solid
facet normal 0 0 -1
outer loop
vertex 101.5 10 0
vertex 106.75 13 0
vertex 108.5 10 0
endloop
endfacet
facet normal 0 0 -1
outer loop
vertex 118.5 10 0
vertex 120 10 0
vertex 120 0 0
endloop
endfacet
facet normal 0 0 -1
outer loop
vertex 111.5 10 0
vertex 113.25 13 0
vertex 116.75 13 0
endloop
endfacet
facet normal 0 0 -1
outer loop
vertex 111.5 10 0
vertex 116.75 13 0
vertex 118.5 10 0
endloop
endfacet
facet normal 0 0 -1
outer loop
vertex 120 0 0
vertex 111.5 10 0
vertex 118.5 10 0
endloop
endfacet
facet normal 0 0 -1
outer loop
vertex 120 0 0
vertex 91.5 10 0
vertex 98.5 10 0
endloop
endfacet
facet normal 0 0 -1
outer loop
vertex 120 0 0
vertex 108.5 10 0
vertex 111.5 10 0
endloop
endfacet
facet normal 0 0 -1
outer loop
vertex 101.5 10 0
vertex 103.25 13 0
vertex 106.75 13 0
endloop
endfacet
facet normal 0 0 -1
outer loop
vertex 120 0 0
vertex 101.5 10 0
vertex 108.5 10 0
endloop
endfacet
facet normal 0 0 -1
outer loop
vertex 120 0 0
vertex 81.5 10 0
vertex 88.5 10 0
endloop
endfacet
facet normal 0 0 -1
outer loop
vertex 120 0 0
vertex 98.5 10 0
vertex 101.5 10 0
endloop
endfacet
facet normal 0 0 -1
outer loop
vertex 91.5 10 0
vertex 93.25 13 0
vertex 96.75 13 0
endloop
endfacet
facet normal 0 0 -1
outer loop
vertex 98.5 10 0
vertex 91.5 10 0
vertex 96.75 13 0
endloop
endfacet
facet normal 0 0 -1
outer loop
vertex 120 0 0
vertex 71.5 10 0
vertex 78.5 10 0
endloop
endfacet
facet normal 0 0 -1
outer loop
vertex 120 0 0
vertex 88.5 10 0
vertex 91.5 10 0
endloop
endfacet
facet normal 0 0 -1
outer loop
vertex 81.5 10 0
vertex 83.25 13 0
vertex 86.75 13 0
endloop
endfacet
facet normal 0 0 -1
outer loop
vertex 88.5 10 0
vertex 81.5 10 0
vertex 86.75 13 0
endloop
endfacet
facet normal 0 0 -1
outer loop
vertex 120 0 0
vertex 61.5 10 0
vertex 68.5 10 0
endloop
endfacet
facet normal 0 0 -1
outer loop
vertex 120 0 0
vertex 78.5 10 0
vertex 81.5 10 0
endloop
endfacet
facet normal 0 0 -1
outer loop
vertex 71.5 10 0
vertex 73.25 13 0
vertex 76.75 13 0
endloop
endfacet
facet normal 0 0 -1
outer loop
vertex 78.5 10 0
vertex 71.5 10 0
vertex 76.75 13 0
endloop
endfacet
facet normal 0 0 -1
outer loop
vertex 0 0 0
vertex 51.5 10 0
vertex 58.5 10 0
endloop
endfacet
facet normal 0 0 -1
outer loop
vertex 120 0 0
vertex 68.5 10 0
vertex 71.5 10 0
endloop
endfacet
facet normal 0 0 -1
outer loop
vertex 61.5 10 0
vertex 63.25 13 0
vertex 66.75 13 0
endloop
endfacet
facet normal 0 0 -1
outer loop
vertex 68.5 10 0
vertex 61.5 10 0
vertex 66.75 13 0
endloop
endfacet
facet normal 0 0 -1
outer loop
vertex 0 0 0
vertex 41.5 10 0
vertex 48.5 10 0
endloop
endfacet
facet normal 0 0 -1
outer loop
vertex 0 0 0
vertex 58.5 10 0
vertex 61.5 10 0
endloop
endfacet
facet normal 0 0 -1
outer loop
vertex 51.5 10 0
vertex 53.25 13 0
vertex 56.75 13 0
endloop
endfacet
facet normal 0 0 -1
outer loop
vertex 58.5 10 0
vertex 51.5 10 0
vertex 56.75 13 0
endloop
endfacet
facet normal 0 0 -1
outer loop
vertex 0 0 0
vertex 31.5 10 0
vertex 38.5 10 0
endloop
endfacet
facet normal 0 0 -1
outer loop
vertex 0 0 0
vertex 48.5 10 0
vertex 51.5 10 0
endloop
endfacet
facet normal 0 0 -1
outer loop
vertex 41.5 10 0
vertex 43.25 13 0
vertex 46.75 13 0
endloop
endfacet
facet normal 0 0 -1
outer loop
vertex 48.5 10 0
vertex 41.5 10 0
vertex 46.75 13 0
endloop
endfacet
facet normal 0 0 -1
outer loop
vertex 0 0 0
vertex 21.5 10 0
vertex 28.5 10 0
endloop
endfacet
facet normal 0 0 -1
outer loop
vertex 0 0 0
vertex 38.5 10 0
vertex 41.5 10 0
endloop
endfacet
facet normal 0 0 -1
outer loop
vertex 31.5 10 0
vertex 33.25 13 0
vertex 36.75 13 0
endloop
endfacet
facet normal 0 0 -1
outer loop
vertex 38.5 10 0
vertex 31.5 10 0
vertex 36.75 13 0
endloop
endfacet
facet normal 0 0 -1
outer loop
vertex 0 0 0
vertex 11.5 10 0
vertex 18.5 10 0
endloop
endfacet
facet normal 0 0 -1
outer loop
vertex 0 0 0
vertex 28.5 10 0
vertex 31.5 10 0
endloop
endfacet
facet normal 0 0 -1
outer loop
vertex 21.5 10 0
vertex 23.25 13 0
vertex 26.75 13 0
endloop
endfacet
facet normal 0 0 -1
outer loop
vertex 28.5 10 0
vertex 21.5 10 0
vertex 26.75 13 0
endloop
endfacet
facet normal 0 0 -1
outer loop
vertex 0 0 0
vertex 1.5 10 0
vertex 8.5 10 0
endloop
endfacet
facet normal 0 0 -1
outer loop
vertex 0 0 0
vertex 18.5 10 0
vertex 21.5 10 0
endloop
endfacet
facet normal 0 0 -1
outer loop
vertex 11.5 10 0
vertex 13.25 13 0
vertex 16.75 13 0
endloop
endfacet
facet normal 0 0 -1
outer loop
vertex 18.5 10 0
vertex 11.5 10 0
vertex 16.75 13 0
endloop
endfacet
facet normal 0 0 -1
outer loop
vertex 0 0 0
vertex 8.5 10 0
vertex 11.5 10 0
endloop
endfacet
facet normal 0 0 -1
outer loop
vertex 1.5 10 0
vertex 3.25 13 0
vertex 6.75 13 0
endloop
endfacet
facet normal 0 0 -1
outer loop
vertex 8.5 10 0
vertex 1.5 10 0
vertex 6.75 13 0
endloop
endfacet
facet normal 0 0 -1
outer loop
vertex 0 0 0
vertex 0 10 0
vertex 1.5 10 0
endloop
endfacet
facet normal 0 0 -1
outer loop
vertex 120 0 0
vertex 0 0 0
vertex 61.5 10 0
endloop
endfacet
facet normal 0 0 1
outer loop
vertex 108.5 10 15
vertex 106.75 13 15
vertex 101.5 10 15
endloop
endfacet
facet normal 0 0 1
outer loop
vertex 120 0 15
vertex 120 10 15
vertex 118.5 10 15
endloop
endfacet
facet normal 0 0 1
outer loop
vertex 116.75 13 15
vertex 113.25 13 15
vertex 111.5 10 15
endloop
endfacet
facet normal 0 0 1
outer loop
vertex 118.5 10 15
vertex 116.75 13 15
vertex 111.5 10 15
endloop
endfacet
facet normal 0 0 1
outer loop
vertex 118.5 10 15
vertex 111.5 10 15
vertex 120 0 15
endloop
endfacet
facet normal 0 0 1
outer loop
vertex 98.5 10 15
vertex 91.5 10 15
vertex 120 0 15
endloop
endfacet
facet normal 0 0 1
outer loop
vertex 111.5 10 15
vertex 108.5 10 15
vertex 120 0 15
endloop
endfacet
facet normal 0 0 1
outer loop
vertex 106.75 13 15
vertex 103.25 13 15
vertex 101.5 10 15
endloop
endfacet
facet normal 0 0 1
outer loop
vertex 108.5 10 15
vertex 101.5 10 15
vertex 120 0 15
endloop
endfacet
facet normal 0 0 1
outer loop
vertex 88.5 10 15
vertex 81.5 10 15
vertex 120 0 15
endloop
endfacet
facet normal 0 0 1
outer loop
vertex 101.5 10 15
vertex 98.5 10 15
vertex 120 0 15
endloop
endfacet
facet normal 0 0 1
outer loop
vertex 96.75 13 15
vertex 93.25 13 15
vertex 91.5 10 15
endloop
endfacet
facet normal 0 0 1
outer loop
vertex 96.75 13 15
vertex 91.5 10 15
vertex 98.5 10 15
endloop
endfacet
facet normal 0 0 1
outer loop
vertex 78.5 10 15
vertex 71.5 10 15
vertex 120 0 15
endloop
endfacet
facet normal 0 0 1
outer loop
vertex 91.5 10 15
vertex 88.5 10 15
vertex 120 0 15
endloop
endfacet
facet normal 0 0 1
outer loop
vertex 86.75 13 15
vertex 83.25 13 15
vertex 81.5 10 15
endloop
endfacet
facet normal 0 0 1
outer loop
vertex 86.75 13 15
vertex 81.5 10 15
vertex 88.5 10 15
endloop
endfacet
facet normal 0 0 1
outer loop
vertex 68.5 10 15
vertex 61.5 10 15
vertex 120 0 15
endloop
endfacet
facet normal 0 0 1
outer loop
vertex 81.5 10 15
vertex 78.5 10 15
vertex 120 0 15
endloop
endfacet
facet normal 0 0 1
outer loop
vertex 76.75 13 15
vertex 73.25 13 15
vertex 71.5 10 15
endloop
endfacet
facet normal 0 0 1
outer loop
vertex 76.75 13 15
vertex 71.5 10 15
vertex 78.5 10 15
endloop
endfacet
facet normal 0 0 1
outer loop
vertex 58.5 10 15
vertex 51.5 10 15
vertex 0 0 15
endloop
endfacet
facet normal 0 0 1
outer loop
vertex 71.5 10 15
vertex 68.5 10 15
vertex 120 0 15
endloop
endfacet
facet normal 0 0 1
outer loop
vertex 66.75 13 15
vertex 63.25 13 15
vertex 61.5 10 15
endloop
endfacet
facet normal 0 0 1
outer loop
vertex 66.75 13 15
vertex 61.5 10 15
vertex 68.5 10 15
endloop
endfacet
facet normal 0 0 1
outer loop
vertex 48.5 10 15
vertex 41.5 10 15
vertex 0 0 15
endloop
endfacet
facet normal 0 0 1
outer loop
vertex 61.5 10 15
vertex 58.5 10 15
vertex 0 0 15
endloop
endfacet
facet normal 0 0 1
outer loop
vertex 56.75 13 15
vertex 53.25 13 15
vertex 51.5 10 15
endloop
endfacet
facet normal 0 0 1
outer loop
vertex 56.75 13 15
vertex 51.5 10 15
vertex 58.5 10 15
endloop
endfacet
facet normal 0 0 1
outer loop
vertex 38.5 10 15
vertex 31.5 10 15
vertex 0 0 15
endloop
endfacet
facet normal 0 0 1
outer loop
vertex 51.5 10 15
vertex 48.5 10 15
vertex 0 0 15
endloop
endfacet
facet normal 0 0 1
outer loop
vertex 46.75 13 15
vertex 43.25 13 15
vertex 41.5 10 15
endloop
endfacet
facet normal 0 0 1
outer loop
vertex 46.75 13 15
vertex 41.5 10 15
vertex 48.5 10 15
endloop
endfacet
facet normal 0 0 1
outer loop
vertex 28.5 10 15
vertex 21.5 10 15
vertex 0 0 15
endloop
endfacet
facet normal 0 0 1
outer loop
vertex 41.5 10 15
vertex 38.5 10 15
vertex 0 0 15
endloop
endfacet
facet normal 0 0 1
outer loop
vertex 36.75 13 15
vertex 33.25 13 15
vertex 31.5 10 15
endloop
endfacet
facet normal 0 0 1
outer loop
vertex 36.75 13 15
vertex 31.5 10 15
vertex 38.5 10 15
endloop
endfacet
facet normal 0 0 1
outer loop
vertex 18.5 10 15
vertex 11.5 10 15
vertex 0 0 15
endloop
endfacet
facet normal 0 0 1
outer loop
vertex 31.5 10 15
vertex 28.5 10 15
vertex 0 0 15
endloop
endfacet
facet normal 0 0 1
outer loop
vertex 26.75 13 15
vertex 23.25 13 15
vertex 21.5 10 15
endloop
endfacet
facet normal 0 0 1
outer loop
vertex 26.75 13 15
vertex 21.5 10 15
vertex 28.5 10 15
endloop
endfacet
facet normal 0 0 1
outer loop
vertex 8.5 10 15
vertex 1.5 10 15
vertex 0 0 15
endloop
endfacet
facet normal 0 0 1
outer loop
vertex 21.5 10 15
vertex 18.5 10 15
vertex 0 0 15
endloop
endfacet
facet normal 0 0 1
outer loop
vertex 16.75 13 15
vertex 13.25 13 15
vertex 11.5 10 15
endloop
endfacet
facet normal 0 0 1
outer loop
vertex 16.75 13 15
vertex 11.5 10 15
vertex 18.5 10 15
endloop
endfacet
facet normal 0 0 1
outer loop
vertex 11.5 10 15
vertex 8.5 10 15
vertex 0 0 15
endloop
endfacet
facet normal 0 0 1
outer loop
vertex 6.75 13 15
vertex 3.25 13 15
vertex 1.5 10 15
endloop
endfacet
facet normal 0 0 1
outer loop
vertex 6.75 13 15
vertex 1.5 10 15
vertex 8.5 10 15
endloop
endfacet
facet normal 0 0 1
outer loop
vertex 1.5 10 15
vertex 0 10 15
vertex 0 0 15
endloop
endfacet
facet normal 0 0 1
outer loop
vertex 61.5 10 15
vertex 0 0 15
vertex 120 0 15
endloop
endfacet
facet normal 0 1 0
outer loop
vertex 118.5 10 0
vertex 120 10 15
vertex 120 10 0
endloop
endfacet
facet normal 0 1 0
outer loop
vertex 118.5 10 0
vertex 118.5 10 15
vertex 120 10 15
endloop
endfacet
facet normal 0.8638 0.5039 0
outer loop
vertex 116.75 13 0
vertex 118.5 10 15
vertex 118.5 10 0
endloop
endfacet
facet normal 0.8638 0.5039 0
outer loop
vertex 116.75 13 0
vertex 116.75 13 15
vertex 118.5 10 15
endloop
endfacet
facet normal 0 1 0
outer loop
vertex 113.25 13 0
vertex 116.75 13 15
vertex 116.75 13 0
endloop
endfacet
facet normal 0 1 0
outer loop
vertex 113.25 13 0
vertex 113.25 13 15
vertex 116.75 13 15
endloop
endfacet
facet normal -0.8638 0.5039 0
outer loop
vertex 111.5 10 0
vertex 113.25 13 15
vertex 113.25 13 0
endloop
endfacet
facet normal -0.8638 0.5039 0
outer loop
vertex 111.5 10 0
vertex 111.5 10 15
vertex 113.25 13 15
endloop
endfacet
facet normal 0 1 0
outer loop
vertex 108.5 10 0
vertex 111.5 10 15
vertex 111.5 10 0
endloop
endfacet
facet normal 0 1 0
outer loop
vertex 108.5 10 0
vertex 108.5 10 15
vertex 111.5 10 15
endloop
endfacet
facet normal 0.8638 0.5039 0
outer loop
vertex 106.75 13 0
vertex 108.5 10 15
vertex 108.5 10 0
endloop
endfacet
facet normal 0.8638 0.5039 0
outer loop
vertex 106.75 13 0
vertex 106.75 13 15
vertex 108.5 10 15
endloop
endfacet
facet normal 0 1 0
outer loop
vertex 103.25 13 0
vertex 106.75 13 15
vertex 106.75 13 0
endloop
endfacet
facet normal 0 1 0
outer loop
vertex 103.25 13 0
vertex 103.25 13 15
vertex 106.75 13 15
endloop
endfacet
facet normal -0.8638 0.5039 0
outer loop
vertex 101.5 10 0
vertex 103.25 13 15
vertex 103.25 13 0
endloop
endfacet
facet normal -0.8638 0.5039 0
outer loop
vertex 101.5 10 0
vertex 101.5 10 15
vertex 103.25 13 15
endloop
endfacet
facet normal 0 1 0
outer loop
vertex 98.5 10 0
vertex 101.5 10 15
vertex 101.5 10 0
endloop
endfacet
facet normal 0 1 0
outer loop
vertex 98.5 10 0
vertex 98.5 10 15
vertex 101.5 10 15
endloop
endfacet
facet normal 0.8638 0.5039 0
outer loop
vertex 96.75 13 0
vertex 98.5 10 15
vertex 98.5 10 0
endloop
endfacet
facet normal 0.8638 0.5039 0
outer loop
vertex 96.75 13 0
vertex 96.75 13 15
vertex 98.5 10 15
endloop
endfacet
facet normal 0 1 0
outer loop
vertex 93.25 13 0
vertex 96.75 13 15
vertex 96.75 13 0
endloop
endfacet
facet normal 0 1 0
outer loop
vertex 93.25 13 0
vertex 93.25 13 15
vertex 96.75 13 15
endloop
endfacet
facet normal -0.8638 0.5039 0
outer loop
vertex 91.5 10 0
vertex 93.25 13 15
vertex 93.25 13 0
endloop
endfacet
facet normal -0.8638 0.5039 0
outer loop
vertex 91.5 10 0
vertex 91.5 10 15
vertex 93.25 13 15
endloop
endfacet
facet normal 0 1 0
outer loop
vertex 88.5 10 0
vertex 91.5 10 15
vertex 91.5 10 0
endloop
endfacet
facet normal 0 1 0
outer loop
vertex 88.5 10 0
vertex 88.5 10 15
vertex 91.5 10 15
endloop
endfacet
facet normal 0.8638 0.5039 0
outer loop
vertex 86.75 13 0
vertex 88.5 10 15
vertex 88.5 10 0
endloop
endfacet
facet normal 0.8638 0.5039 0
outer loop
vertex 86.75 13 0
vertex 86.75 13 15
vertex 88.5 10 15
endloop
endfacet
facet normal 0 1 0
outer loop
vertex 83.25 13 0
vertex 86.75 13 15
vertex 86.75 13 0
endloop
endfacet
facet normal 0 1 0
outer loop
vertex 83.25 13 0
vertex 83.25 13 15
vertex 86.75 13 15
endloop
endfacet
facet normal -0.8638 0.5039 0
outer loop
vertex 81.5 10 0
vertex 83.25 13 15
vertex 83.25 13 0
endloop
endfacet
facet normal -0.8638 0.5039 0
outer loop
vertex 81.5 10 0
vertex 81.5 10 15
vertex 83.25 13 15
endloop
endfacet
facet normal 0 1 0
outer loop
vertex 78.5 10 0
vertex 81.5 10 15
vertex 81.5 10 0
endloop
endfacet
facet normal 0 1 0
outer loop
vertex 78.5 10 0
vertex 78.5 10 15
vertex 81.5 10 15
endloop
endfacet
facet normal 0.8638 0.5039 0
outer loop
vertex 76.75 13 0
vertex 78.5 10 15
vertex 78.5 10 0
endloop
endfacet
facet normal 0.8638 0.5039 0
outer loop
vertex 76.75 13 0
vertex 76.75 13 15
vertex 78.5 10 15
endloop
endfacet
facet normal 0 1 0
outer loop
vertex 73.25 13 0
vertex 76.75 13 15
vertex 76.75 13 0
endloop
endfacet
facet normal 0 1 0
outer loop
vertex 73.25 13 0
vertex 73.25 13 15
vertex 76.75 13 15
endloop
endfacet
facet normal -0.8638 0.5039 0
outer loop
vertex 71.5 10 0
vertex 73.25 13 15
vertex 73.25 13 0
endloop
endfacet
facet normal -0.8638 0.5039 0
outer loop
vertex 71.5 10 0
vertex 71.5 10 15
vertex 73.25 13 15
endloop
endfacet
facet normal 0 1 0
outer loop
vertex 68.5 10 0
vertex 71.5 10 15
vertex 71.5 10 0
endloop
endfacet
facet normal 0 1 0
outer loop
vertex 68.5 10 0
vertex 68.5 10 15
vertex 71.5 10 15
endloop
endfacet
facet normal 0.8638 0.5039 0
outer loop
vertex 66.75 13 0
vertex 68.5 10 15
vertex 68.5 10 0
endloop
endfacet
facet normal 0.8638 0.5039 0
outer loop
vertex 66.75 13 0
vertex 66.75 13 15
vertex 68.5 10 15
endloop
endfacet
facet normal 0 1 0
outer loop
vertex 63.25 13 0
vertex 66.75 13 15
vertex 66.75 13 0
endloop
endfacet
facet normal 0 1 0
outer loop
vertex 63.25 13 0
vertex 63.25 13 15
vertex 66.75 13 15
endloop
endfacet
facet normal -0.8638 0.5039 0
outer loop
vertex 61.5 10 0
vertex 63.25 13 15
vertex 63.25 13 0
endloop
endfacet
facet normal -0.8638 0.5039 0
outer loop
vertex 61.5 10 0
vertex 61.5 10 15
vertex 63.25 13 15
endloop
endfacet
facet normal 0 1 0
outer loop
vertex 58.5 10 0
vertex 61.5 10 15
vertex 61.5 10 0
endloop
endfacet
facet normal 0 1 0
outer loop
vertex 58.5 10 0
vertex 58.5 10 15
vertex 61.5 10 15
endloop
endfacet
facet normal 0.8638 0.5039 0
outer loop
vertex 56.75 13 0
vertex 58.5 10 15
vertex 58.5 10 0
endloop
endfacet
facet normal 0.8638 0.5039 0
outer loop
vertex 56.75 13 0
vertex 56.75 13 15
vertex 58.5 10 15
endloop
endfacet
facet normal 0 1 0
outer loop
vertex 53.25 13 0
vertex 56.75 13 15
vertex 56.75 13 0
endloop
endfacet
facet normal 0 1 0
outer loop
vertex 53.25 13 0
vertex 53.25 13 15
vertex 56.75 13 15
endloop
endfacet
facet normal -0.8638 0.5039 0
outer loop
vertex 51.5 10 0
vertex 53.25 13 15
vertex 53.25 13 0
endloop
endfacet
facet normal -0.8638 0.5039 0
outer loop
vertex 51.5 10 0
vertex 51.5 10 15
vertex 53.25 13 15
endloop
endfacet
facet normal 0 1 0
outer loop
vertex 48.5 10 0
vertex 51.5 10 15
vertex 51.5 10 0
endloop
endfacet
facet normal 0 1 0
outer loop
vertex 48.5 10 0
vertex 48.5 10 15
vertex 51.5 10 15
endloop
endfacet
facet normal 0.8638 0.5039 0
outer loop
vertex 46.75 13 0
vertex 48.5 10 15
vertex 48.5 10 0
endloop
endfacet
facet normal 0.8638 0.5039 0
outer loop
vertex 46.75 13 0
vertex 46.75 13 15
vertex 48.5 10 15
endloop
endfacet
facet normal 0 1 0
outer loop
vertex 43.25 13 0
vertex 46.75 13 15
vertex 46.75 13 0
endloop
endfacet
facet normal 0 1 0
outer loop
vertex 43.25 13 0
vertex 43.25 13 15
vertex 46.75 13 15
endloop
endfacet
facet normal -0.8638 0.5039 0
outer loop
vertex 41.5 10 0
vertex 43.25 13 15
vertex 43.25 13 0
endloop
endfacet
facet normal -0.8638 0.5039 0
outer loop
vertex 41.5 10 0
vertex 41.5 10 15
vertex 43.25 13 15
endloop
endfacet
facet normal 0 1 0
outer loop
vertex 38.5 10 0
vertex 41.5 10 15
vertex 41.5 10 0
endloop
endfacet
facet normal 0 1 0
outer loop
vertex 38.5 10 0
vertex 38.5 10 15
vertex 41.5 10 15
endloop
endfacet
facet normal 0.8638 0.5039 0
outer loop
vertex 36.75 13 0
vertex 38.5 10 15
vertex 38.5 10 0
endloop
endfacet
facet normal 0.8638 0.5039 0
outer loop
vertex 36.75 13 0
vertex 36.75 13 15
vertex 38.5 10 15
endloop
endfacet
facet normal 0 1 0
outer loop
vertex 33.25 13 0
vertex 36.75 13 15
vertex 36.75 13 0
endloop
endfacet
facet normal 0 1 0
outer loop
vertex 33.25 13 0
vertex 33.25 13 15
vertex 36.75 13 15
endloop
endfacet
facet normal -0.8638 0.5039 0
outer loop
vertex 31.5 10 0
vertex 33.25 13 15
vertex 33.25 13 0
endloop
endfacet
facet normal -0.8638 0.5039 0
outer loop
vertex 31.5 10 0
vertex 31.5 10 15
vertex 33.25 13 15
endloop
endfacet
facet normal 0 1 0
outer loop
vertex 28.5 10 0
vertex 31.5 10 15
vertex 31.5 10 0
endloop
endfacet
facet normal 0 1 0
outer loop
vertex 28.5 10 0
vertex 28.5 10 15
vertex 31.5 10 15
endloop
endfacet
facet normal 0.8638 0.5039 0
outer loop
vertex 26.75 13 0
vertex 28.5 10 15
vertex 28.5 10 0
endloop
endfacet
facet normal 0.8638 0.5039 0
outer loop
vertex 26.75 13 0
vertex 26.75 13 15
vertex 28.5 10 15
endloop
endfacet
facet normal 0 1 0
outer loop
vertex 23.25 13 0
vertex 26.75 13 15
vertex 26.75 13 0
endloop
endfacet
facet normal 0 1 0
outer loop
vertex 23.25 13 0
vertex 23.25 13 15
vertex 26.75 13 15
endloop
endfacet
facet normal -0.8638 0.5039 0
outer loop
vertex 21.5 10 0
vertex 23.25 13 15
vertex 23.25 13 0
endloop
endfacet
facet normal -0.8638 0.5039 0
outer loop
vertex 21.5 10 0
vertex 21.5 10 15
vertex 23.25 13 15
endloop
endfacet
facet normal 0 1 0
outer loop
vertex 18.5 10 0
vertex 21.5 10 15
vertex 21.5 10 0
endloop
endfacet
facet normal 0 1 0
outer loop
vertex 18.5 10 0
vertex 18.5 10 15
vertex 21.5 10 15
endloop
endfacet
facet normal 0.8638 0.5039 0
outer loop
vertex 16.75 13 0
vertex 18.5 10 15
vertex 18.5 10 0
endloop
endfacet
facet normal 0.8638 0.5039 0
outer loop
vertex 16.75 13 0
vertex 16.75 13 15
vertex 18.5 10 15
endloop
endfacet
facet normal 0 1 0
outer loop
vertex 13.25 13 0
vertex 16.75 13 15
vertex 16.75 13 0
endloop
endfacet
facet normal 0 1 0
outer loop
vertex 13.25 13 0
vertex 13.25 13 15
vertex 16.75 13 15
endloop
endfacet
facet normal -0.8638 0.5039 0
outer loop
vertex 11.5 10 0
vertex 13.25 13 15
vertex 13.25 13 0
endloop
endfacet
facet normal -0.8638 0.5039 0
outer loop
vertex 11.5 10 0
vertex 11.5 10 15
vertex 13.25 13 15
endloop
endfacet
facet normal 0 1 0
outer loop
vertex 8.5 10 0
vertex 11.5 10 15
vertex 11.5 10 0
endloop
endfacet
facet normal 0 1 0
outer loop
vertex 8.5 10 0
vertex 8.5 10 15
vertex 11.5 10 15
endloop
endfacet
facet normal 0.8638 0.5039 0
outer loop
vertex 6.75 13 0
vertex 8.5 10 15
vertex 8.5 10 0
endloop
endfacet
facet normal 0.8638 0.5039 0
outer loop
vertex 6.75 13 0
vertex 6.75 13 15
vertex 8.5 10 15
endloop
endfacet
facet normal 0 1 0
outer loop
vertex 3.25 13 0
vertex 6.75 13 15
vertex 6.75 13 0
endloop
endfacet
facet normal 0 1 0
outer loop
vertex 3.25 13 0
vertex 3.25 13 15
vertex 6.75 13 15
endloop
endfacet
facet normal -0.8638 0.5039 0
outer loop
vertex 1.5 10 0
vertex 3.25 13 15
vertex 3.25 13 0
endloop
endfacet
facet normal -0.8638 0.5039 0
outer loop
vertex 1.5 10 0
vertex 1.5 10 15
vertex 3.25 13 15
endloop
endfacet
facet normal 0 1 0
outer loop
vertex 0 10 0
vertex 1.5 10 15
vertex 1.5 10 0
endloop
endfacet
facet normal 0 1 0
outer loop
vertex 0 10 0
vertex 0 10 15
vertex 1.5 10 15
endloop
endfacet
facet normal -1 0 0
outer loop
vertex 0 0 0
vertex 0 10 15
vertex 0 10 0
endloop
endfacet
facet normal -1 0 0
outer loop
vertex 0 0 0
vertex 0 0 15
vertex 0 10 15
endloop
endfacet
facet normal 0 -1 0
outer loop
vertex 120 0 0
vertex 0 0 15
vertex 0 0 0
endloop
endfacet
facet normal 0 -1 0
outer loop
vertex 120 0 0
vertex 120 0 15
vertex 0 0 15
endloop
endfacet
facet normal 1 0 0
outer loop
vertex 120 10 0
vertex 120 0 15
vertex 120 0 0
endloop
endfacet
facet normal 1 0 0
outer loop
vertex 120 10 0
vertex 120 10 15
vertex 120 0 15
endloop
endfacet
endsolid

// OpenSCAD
$fn = 32;

// ----------------------------------------------------------------------
// Gear rack: 12 teeth, pitch 10 mm
// ----------------------------------------------------------------------

// --- parameters (mm) ---
teeth = 12;               // number of teeth
pitch = 10;               // tooth pitch, X
root_w = 7;               // tooth width at the root
tip_w = 3.5;              // tooth width at the tip
base_h = 10;              // rack body height, Y
tooth_h = 3;              // tooth height above the body
plate_t = 15;             // rack width, Z (extrusion height)

rack_l = teeth * pitch;  // overall length
total_h = base_h + tooth_h;  // overall height

profile = [[0, 0], [120, 0], [120, 10], [118.5, 10], [116.75, 13], [113.25, 13], [111.5, 10], [108.5, 10], [106.75, 13], [103.25, 13], [101.5, 10], [98.5, 10], [96.75, 13], [93.25, 13], [91.5, 10], [88.5, 10], [86.75, 13], [83.25, 13], [81.5, 10], [78.5, 10], [76.75, 13], [73.25, 13], [71.5, 10], [68.5, 10], [66.75, 13], [63.25, 13], [61.5, 10], [58.5, 10], [56.75, 13], [53.25, 13], [51.5, 10], [48.5, 10], [46.75, 13], [43.25, 13], [41.5, 10], [38.5, 10], [36.75, 13], [33.25, 13], [31.5, 10], [28.5, 10], [26.75, 13], [23.25, 13], [21.5, 10], [18.5, 10], [16.75, 13], [13.25, 13], [11.5, 10], [8.5, 10], [6.75, 13], [3.25, 13], [1.5, 10], [0, 10]];  // primary outline, 52 points, counter clockwise

// --- the one profile operation ---
linear_extrude(height = plate_t) polygon(points = profile);
